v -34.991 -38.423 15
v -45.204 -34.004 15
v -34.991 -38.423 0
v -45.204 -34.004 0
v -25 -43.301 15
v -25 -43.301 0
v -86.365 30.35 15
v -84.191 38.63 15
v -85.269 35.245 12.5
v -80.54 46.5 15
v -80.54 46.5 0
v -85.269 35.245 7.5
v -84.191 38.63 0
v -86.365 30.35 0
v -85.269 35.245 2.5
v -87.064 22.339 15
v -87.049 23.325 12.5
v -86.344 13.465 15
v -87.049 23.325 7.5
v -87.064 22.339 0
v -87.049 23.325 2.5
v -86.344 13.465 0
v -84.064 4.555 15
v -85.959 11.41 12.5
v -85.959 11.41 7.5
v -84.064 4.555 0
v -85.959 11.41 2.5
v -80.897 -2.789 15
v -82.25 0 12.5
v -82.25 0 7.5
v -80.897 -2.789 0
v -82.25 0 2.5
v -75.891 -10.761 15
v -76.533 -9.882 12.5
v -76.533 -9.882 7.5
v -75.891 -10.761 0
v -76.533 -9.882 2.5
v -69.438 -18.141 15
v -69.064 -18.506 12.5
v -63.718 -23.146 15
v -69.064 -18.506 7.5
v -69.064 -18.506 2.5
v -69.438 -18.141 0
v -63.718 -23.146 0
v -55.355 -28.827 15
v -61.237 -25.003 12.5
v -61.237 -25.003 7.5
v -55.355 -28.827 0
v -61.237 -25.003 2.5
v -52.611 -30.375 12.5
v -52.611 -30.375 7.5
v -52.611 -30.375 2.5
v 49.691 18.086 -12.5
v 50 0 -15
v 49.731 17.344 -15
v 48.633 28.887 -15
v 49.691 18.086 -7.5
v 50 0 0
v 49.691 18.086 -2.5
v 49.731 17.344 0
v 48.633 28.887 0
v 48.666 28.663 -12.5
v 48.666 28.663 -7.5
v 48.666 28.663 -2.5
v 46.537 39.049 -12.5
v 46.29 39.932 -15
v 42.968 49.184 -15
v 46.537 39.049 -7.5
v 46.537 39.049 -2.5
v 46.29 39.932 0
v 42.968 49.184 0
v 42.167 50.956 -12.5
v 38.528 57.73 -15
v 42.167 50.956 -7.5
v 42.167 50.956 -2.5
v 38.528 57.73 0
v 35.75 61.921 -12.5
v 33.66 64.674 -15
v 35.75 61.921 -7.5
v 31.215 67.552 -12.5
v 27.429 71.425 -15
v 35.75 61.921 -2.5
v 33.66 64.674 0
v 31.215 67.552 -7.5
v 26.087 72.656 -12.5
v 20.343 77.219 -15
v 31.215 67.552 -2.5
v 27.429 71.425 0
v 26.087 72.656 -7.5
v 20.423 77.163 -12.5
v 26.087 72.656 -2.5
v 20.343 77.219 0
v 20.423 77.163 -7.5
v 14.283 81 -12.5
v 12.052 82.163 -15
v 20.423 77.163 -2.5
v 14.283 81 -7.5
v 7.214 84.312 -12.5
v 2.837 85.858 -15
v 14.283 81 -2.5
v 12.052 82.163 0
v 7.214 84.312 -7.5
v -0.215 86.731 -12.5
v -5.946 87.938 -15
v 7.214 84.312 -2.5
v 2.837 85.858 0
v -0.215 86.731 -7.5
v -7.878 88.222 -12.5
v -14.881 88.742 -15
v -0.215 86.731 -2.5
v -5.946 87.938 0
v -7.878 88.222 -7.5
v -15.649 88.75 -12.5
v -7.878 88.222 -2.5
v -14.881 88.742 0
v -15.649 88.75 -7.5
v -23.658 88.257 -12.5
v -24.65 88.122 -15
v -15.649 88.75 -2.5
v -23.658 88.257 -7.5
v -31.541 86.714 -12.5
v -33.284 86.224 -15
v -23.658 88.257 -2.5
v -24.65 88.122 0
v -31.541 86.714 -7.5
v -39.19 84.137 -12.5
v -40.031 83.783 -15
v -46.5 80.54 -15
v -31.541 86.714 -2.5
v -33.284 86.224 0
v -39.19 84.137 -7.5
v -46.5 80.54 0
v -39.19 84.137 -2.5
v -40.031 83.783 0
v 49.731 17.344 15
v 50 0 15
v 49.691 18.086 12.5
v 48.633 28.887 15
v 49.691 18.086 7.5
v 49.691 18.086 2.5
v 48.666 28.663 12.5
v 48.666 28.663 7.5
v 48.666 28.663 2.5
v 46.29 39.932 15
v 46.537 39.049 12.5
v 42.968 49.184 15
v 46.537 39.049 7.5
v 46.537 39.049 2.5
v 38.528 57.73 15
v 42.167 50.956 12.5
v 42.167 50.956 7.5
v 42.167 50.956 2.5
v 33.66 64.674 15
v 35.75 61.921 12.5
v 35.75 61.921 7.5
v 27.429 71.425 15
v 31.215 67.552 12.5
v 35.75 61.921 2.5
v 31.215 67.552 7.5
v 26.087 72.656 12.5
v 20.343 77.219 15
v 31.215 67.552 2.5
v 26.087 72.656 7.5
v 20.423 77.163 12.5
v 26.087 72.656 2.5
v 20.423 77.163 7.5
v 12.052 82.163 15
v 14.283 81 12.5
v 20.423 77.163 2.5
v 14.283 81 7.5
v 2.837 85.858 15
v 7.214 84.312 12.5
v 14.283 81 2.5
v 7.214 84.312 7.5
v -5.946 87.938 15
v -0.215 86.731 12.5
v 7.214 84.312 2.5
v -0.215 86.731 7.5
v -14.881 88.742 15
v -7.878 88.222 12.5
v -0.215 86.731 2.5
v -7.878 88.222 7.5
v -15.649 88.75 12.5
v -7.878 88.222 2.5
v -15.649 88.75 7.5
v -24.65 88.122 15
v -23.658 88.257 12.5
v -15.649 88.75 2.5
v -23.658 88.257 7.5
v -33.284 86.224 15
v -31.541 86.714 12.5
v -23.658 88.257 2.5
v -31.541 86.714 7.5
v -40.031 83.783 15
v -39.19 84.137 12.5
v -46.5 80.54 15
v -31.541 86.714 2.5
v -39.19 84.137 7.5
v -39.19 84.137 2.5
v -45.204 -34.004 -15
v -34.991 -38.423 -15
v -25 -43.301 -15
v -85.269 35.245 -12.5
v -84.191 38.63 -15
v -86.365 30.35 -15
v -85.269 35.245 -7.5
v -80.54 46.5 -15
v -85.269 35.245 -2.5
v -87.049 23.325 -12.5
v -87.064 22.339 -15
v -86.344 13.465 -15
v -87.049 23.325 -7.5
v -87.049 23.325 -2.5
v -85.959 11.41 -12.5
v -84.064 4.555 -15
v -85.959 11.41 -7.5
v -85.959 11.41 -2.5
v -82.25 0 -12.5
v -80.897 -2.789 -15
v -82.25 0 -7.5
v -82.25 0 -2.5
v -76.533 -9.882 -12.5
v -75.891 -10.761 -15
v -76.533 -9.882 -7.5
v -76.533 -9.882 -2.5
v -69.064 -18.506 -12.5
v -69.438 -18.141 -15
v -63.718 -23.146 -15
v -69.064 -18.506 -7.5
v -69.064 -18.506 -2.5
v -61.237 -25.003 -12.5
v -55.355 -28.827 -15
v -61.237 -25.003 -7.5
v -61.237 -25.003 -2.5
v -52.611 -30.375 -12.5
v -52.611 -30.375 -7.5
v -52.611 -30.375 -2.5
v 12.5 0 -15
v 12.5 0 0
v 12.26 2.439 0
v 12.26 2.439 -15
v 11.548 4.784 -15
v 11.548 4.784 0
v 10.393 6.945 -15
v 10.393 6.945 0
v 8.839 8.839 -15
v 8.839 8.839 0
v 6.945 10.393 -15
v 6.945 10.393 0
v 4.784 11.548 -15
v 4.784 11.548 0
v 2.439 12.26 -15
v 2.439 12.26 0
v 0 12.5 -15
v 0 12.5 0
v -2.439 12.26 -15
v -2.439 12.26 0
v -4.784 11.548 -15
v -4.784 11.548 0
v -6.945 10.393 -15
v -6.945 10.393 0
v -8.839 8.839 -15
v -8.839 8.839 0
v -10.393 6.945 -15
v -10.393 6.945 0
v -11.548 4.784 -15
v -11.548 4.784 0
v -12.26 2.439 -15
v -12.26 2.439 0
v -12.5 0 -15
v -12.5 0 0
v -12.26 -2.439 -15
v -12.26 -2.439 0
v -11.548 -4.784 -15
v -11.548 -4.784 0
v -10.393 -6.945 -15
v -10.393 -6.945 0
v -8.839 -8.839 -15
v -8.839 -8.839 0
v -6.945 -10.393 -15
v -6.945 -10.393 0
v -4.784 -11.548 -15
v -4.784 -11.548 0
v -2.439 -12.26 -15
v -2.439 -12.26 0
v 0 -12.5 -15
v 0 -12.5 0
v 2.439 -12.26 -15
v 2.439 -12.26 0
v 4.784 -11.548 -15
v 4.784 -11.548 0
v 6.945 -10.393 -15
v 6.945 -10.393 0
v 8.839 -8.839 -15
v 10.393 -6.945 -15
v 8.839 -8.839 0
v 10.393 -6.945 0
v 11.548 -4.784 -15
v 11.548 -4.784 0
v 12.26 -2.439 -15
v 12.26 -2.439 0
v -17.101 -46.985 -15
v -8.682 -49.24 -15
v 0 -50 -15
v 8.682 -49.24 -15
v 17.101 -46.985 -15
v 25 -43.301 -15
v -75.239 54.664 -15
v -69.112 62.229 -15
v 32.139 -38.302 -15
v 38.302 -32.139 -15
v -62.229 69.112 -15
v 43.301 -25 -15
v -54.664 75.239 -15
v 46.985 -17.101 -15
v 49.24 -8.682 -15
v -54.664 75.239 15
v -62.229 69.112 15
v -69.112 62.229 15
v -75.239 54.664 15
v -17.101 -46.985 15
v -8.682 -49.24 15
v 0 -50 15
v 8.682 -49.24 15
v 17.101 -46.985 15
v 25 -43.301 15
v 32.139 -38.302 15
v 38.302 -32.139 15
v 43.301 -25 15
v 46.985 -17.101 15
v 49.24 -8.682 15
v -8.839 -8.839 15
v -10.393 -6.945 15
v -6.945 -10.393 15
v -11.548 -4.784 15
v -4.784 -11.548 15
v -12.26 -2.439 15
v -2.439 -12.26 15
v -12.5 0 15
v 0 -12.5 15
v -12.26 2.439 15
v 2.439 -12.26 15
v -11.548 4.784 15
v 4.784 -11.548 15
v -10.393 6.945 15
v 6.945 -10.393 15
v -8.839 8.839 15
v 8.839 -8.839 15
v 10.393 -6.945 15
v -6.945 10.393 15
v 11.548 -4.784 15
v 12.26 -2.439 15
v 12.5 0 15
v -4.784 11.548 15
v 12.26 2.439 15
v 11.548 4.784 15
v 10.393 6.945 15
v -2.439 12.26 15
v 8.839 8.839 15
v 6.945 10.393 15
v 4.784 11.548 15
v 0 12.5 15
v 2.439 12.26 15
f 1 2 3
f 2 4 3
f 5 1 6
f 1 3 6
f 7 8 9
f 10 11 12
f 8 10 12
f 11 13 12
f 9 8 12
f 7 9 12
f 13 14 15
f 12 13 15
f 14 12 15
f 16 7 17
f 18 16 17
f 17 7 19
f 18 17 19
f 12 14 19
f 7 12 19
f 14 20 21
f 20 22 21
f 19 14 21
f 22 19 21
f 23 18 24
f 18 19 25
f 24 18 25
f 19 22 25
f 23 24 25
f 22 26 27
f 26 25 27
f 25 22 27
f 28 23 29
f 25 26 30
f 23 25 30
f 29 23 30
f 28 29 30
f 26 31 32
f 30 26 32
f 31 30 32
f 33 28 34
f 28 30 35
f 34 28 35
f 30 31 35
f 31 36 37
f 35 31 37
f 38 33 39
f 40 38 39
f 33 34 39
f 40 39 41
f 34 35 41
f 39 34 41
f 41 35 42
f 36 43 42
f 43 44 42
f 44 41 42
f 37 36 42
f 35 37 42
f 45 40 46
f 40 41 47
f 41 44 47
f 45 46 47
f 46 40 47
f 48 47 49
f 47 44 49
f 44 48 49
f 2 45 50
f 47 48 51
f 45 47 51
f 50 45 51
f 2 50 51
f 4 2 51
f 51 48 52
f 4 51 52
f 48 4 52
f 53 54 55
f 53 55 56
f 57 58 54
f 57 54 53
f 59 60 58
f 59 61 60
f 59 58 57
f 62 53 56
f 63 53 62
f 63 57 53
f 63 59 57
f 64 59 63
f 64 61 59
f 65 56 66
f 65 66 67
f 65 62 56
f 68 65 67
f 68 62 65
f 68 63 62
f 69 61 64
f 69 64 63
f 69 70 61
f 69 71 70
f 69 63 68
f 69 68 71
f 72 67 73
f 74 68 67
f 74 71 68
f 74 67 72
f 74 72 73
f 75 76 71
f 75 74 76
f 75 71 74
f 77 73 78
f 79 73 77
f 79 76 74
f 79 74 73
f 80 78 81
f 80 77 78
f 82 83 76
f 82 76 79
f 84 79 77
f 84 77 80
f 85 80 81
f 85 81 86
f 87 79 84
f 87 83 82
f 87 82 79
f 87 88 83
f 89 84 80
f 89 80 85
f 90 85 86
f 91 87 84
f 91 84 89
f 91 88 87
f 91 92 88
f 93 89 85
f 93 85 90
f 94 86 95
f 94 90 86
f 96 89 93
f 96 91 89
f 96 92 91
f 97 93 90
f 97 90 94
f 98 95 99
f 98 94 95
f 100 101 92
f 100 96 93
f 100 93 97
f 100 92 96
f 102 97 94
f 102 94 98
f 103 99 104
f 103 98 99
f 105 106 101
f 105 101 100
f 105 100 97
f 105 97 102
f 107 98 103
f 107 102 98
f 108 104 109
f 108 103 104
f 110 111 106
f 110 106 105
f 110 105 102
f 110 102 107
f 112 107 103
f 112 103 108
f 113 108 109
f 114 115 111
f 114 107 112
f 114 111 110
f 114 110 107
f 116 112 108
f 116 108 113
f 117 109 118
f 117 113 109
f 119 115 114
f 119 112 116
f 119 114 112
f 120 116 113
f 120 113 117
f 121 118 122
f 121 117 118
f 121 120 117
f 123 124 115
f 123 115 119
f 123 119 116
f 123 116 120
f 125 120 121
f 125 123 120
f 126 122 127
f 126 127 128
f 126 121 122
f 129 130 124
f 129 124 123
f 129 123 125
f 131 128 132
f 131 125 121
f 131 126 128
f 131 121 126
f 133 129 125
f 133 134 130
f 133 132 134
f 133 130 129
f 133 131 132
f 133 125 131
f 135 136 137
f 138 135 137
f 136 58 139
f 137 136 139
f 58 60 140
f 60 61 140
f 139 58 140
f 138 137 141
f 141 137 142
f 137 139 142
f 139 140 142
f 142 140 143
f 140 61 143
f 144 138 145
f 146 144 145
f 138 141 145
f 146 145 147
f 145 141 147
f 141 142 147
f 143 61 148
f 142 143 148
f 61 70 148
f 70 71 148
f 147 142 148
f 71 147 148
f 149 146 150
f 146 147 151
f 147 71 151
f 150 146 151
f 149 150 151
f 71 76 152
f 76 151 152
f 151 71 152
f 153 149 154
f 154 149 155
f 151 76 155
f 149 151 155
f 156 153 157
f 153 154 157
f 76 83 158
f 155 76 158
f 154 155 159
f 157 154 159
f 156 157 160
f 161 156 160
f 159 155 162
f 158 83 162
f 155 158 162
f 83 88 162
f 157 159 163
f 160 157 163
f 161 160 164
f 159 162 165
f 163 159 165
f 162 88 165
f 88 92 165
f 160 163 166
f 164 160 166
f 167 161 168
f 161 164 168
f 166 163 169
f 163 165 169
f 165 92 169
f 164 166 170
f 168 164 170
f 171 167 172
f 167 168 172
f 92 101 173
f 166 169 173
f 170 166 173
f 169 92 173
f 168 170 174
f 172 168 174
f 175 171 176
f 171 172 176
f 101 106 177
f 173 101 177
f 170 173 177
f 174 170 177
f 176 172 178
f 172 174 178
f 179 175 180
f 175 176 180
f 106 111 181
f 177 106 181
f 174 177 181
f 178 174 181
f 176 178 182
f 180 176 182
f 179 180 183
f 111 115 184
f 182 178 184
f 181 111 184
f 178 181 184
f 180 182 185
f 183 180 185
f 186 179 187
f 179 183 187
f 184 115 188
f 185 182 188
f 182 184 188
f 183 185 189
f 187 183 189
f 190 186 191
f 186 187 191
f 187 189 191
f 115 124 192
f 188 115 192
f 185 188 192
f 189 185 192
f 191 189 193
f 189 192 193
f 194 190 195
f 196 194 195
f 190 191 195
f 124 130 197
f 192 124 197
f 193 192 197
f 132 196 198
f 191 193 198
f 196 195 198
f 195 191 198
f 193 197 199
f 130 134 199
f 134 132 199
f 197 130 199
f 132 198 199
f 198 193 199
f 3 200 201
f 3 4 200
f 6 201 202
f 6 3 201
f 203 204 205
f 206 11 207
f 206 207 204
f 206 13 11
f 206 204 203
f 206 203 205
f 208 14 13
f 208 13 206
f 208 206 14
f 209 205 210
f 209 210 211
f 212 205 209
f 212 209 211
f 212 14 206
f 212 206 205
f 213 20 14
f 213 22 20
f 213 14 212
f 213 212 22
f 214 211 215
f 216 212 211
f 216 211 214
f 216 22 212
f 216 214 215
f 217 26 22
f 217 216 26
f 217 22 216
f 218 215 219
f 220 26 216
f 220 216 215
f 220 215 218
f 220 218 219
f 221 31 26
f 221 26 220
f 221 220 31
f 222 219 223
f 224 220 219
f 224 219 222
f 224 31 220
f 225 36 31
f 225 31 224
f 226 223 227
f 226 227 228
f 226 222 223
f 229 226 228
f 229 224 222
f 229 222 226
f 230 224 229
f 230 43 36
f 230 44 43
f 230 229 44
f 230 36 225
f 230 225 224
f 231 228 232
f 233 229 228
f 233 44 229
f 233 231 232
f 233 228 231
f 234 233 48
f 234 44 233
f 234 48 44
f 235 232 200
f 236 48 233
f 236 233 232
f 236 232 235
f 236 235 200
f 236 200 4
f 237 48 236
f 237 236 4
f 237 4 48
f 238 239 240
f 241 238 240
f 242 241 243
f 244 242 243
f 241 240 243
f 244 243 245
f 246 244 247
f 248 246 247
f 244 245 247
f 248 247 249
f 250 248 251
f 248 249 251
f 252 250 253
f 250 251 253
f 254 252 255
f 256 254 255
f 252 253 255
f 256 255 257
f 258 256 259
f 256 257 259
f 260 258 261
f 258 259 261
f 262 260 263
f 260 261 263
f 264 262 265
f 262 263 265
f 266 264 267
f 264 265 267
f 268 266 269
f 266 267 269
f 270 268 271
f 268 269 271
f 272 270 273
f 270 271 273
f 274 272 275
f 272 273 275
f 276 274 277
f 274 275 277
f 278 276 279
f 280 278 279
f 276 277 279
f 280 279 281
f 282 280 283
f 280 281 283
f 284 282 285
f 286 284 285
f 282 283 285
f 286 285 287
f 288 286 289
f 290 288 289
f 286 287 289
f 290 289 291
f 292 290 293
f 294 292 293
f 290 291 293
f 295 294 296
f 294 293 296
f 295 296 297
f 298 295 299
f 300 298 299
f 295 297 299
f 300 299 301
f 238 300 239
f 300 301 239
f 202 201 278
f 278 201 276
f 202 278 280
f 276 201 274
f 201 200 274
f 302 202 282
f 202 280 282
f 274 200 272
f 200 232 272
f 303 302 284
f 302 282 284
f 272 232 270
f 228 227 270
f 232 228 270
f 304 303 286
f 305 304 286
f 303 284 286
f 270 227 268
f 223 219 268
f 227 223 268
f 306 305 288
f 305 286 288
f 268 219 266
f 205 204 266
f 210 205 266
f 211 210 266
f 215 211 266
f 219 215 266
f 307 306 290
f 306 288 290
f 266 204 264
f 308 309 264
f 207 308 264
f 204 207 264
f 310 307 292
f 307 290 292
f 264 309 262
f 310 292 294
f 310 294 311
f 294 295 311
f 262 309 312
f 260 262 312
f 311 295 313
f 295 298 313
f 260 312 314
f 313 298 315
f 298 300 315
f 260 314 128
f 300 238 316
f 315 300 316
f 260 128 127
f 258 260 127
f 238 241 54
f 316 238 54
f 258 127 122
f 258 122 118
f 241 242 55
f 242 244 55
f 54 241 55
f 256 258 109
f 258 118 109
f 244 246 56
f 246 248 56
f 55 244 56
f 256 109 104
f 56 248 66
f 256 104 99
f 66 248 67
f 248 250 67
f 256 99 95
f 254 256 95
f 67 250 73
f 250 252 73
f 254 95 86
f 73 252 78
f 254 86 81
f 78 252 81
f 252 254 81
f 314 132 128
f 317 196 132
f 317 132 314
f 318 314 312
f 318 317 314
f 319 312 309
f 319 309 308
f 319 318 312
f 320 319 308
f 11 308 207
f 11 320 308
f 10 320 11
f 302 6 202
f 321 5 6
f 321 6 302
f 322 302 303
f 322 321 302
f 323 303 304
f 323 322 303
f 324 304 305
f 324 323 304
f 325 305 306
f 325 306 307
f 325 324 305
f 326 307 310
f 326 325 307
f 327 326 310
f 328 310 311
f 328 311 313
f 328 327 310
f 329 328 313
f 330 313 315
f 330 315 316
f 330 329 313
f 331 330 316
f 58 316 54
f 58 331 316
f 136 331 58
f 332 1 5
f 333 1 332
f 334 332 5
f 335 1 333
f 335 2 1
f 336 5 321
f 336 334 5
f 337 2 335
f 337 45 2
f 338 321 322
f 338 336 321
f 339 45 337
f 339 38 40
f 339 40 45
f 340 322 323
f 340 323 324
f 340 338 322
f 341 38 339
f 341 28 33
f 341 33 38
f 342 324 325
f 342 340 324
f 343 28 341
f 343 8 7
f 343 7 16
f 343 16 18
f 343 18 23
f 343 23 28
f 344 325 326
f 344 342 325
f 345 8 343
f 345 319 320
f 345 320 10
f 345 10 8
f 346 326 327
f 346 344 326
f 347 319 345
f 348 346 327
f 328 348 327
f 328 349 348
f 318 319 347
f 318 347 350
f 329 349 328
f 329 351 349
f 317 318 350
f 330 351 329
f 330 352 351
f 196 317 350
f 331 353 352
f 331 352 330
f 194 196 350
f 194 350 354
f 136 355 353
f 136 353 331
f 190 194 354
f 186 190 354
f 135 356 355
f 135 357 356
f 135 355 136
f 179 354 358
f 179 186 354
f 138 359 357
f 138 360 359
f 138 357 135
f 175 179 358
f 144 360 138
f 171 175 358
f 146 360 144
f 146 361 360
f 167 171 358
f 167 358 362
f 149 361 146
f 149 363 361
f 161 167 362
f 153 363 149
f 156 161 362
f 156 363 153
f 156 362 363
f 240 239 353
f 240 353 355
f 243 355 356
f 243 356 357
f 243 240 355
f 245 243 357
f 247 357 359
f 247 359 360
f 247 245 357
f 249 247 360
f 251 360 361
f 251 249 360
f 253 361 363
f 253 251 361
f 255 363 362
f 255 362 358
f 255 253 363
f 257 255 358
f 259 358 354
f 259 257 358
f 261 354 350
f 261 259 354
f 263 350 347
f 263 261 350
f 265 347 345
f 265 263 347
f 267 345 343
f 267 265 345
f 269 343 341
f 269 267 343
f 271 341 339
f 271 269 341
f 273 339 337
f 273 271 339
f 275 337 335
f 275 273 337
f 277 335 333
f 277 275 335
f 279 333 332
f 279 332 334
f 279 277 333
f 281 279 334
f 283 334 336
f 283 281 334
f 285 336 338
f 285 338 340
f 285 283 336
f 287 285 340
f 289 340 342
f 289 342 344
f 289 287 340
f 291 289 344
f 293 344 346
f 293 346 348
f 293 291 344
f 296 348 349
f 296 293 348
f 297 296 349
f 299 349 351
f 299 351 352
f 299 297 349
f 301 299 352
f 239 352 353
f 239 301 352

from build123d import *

# Parameters (mm, degrees)
SKETCH2_R           = 12.5
BOSS_EXTRUDE1_DEPTH = 15


with BuildPart() as part:
    # Sketch2 → Boss-Extrude1 (new, symmetric)
    with BuildSketch(Plane.XY):
        with BuildLine():
            ThreePointArc((-25, -43.301270189), (25, -43.301270189), (50, 0))
            add(Edge.make_bspline(
                [(50, 0), (50, 5.9743789), (50.060204805, 19.153466901), (47.336306516, 40.629698689), (36.605550445, 63.925706776), (14.837765348, 83.47937862), (-16.036151317, 91.500359053), (-37.028144976, 86.0089406), (-46.5, 80.540362552)],
                knots=[0, 0, 0, 0, 0.115850128, 0.251620343, 0.413575869, 0.597518573, 0.795537987, 1, 1, 1, 1], degree=3))
            ThreePointArc((-46.5, 80.540362552), (-65.76093065, 65.76093065), (-80.540362552, 46.5))
            add(Edge.make_bspline(
                [(-80.540362552, 46.5), (-84.677739575, 39.333852786), (-88.984807521, 23.508055578), (-83.903495936, -0.398811065), (-70.457282721, -18.813024137), (-53.932446022, -30.410798629), (-38.313686898, -36.970503945), (-28.970010712, -41.009183436), (-25, -43.301270189)],
                knots=[0, 0, 0, 0, 0.198313599, 0.394495842, 0.581696629, 0.748830999, 0.886895994, 1, 1, 1, 1], degree=3))
        make_face()
        Circle(SKETCH2_R, mode=Mode.SUBTRACT)
    extrude(amount=BOSS_EXTRUDE1_DEPTH, both=True)


solid = part.part
